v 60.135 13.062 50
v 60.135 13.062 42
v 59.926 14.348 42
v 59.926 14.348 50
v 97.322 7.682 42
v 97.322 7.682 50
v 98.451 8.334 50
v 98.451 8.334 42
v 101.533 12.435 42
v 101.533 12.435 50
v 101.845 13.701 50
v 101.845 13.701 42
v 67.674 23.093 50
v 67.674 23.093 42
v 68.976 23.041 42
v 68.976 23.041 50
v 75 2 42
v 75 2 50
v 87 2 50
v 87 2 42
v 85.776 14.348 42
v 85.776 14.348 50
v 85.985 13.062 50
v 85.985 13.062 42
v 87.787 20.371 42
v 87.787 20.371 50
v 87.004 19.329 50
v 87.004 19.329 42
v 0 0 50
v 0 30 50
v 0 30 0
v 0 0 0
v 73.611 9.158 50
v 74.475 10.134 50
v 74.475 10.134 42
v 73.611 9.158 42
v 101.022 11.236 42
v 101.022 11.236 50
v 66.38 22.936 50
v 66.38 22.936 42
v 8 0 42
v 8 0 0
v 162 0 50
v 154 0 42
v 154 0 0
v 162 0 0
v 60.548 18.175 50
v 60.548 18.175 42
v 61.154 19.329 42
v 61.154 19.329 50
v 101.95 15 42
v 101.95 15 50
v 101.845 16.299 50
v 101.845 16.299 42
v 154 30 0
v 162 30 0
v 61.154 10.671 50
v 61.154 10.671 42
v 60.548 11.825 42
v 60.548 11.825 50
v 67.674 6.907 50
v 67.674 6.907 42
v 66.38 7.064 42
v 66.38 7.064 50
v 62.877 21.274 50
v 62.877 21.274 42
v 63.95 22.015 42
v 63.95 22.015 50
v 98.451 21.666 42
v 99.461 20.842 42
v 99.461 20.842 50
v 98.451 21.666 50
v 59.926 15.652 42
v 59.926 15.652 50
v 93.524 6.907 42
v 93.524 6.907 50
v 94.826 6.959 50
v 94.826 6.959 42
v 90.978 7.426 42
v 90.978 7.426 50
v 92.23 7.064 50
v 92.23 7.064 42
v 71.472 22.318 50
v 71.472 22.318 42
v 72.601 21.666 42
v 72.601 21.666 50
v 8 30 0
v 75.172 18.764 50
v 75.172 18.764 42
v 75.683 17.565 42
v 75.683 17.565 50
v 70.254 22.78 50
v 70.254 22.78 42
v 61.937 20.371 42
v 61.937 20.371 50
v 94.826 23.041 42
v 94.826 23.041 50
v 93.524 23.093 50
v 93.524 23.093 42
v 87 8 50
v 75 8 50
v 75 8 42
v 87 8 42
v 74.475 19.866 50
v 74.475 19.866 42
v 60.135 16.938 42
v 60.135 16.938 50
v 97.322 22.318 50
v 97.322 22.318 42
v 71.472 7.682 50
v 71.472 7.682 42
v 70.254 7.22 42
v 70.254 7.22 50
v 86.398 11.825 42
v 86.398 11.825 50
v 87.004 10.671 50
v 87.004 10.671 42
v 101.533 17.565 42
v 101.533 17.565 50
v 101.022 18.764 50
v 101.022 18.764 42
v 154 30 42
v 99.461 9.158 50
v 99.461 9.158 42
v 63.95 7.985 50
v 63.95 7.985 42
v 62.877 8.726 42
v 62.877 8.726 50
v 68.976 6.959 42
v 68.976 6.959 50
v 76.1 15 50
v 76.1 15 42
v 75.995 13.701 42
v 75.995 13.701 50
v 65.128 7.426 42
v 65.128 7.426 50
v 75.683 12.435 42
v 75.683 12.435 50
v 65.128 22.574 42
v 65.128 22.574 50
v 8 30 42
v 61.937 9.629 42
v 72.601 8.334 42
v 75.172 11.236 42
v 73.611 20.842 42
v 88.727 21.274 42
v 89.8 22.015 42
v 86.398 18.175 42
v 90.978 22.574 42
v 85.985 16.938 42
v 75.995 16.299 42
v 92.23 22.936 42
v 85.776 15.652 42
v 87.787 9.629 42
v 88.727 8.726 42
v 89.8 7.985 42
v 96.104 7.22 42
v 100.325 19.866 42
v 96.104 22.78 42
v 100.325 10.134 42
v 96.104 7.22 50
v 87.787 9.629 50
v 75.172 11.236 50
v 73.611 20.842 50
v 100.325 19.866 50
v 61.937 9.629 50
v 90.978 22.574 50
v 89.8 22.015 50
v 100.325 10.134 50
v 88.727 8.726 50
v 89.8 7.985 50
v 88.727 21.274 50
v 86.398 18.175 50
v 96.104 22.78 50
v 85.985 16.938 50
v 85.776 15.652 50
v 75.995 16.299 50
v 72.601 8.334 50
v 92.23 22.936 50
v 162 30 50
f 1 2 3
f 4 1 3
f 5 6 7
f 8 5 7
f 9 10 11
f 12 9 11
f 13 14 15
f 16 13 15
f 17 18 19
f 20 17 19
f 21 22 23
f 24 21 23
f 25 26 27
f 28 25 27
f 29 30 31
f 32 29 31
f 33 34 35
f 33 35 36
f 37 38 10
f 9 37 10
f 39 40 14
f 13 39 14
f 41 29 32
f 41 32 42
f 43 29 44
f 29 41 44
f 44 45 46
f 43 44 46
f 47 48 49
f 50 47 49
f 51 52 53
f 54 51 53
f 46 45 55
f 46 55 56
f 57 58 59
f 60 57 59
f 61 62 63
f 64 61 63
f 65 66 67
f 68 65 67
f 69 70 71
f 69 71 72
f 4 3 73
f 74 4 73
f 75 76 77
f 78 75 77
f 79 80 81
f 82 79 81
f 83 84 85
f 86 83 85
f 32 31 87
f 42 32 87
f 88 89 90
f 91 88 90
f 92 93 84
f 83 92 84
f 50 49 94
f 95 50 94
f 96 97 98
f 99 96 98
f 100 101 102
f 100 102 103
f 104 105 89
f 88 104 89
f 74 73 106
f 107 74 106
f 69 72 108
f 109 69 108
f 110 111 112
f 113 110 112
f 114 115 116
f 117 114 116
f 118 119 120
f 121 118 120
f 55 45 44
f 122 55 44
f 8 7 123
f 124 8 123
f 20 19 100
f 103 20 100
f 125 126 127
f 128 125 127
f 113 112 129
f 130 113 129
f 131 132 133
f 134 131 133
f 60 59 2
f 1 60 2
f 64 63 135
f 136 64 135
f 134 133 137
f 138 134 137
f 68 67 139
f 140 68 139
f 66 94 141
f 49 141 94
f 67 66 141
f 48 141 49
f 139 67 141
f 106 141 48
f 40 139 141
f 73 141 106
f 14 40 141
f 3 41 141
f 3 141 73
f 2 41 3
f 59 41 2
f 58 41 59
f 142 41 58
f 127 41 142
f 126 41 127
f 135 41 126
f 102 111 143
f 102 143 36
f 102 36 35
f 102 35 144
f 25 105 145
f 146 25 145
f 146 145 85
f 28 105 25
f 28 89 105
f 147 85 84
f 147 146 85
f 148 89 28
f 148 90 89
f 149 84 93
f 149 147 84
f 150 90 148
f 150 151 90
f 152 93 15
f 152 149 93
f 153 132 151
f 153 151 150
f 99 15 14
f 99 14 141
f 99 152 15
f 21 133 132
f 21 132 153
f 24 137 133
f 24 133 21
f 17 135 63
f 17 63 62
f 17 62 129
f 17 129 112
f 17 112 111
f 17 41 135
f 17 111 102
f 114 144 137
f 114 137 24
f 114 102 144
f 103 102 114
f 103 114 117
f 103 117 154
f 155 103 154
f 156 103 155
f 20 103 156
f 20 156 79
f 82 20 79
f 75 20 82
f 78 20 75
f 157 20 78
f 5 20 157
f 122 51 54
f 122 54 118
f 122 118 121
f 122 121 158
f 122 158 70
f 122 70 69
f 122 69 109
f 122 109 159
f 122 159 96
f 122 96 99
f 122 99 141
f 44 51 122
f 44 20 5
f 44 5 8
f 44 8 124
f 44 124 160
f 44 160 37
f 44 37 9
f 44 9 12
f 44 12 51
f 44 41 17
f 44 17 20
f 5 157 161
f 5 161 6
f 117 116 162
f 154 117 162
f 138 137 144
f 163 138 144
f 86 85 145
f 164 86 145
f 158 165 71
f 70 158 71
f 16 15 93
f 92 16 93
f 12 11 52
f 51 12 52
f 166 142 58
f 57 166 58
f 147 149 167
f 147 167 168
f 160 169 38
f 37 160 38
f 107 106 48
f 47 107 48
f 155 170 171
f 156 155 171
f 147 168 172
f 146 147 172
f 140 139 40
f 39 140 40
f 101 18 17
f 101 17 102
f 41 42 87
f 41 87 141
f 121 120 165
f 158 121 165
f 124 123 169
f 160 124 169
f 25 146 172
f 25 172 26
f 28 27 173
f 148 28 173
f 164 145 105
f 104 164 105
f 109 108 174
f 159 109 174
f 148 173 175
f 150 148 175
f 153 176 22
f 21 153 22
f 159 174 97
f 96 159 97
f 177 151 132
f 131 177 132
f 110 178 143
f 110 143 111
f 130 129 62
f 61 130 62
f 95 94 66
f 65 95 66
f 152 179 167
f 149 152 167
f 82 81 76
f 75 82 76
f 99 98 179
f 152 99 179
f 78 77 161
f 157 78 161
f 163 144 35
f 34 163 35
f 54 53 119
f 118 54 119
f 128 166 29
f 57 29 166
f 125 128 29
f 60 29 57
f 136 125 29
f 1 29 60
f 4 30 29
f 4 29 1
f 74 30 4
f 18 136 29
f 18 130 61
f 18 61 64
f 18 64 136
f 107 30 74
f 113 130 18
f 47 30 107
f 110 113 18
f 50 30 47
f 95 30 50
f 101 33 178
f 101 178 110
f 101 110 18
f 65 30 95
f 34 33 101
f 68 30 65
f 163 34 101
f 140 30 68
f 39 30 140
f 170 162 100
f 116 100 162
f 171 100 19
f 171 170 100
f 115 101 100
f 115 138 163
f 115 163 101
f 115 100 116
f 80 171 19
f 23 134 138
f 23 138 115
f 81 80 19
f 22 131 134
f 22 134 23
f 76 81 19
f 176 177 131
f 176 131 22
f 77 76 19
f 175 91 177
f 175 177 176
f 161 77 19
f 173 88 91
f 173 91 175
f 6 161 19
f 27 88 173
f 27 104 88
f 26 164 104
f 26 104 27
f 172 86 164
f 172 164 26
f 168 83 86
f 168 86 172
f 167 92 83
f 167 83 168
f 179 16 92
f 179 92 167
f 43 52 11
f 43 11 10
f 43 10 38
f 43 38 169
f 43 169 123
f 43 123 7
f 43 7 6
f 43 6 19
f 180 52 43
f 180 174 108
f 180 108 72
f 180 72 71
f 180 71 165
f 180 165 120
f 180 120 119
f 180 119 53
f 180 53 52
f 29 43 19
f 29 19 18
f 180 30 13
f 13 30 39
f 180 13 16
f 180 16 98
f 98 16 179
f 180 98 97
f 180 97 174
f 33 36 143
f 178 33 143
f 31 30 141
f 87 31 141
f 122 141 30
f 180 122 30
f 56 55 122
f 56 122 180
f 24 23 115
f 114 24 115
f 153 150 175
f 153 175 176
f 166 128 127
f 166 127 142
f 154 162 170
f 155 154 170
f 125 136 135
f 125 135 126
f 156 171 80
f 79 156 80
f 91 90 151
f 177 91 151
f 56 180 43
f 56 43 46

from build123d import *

# Parameters (mm, degrees)
SKETCH1_W           = 162.000000477
SKETCH1_H           = 50.000000745
BOSS_EXTRUDE1_DEPTH = 29.999999329
SKETCH2_W           = 145.999998786
SKETCH2_H           = 41.999999434
CUT_EXTRUDE1_DEPTH  = 173.174330807
CUT_EXTRUDE2_DEPTH  = 173.174330807
SKETCH4_W           = 11.999994517
SKETCH4_H           = 6.000000285
CUT_EXTRUDE3_DEPTH  = 173.174330807
CUT_EXTRUDE4_DEPTH  = 171.02352798


with BuildPart() as part:
    # Sketch1 → Boss-Extrude1 (new body)
    with BuildSketch(Plane(origin=(0, 29.999999329, 0), x_dir=(1, 0, 0), z_dir=(0, 1, 0))):
        with Locations((81.000000239, -25.000000373)):
            Rectangle(SKETCH1_W, SKETCH1_H)
    extrude(amount=-BOSS_EXTRUDE1_DEPTH)

    # Sketch2 → Cut-Extrude1 (cut, through all)
    with BuildSketch(Plane.XZ):
        with Locations((80.999999773, 20.999999717)):
            Rectangle(SKETCH2_W, SKETCH2_H)
    extrude(amount=-CUT_EXTRUDE1_DEPTH, mode=Mode.SUBTRACT)

    # Sketch3 → Cut-Extrude2 (cut, through all)
    with BuildSketch(Plane.XY.offset(50.000000745)):
        Polygon((85.776269436, 14.348221011), (85.985377431, 13.061543927), (86.398161948, 11.825070716), (87.003961205, 10.67082677), (87.78706193, 9.628706612), (88.727198541, 8.725699037), (89.800000191, 7.985194214), (90.977698565, 7.426368073), (92.229790986, 7.063695695), (93.523852527, 6.906569004), (94.826348126, 6.959058344), (96.103563905, 7.21980352), (97.322411835, 7.68205151), (98.451323807, 8.333831094), (99.461063743, 9.158260189), (100.325487554, 10.133987293), (101.022191346, 11.23574283), (101.533144712, 12.434989214), (101.845107973, 13.7006687), (101.949997246, 14.999999665), (101.845107973, 16.299331561), (101.533144712, 17.565010116), (101.022191346, 18.764257431), (100.325487554, 19.866012037), (99.461063743, 20.841740072), (98.451323807, 21.666171029), (97.322411835, 22.317949682), (96.103563905, 22.780196741), (94.826348126, 23.040940985), (93.523852527, 23.093432188), (92.229790986, 22.936303169), (90.977698565, 22.573631257), (89.800000191, 22.014804184), (88.727198541, 21.274300292), (87.78706193, 20.371293649), (87.003961205, 19.32917349), (86.398161948, 18.174929544), (85.985377431, 16.938457265), (85.776269436, 15.651779249), align=None)
    extrude(amount=-CUT_EXTRUDE2_DEPTH, mode=Mode.SUBTRACT)

    # Sketch4 → Cut-Extrude3 (cut, through all)
    with BuildSketch(Plane.XY.offset(50.000000745)):
        with Locations((81.000000239, 5.000000238)):
            Rectangle(SKETCH4_W, SKETCH4_H)
    extrude(amount=-CUT_EXTRUDE3_DEPTH, mode=Mode.SUBTRACT)

    # Sketch5 → Cut-Extrude4 (cut, through all)
    with BuildSketch(Plane(origin=(0, 0, 41.999999434), x_dir=(-1, 0, 0), z_dir=(0, 0, -1))):
        Polygon((-70.253565907, 22.780196741), (-71.472413838, 22.317949682), (-72.60132581, 21.666171029), (-73.611065745, 20.841740072), (-74.475489557, 19.866012037), (-75.172193348, 18.764257431), (-75.683146715, 17.565010116), (-75.995109975, 16.299331561), (-76.099999249, 14.999999665), (-75.995109975, 13.7006687), (-75.683146715, 12.434989214), (-75.172193348, 11.23574283), (-74.475489557, 10.133987293), (-73.611065745, 9.158260189), (-72.60132581, 8.333831094), (-71.472413838, 7.68205151), (-70.253565907, 7.21980352), (-68.976350129, 6.959058344), (-67.673847079, 6.906569004), (-66.379792988, 7.063695695), (-65.127700567, 7.426368073), (-63.950002193, 7.985194214), (-62.877193093, 8.725699037), (-61.937060207, 9.628706612), (-61.153959483, 10.67082677), (-60.548167676, 11.825070716), (-60.135371983, 13.061543927), (-59.926263988, 14.348221011), (-59.926263988, 15.651779249), (-60.135371983, 16.938457265), (-60.548167676, 18.174929544), (-61.153959483, 19.32917349), (-61.937060207, 20.371293649), (-62.877193093, 21.274300292), (-63.950002193, 22.014804184), (-65.127700567, 22.573631257), (-66.379792988, 22.936303169), (-67.673847079, 23.093432188), (-68.976350129, 23.040940985), align=None)
    extrude(amount=-CUT_EXTRUDE4_DEPTH, mode=Mode.SUBTRACT)


solid = part.part
